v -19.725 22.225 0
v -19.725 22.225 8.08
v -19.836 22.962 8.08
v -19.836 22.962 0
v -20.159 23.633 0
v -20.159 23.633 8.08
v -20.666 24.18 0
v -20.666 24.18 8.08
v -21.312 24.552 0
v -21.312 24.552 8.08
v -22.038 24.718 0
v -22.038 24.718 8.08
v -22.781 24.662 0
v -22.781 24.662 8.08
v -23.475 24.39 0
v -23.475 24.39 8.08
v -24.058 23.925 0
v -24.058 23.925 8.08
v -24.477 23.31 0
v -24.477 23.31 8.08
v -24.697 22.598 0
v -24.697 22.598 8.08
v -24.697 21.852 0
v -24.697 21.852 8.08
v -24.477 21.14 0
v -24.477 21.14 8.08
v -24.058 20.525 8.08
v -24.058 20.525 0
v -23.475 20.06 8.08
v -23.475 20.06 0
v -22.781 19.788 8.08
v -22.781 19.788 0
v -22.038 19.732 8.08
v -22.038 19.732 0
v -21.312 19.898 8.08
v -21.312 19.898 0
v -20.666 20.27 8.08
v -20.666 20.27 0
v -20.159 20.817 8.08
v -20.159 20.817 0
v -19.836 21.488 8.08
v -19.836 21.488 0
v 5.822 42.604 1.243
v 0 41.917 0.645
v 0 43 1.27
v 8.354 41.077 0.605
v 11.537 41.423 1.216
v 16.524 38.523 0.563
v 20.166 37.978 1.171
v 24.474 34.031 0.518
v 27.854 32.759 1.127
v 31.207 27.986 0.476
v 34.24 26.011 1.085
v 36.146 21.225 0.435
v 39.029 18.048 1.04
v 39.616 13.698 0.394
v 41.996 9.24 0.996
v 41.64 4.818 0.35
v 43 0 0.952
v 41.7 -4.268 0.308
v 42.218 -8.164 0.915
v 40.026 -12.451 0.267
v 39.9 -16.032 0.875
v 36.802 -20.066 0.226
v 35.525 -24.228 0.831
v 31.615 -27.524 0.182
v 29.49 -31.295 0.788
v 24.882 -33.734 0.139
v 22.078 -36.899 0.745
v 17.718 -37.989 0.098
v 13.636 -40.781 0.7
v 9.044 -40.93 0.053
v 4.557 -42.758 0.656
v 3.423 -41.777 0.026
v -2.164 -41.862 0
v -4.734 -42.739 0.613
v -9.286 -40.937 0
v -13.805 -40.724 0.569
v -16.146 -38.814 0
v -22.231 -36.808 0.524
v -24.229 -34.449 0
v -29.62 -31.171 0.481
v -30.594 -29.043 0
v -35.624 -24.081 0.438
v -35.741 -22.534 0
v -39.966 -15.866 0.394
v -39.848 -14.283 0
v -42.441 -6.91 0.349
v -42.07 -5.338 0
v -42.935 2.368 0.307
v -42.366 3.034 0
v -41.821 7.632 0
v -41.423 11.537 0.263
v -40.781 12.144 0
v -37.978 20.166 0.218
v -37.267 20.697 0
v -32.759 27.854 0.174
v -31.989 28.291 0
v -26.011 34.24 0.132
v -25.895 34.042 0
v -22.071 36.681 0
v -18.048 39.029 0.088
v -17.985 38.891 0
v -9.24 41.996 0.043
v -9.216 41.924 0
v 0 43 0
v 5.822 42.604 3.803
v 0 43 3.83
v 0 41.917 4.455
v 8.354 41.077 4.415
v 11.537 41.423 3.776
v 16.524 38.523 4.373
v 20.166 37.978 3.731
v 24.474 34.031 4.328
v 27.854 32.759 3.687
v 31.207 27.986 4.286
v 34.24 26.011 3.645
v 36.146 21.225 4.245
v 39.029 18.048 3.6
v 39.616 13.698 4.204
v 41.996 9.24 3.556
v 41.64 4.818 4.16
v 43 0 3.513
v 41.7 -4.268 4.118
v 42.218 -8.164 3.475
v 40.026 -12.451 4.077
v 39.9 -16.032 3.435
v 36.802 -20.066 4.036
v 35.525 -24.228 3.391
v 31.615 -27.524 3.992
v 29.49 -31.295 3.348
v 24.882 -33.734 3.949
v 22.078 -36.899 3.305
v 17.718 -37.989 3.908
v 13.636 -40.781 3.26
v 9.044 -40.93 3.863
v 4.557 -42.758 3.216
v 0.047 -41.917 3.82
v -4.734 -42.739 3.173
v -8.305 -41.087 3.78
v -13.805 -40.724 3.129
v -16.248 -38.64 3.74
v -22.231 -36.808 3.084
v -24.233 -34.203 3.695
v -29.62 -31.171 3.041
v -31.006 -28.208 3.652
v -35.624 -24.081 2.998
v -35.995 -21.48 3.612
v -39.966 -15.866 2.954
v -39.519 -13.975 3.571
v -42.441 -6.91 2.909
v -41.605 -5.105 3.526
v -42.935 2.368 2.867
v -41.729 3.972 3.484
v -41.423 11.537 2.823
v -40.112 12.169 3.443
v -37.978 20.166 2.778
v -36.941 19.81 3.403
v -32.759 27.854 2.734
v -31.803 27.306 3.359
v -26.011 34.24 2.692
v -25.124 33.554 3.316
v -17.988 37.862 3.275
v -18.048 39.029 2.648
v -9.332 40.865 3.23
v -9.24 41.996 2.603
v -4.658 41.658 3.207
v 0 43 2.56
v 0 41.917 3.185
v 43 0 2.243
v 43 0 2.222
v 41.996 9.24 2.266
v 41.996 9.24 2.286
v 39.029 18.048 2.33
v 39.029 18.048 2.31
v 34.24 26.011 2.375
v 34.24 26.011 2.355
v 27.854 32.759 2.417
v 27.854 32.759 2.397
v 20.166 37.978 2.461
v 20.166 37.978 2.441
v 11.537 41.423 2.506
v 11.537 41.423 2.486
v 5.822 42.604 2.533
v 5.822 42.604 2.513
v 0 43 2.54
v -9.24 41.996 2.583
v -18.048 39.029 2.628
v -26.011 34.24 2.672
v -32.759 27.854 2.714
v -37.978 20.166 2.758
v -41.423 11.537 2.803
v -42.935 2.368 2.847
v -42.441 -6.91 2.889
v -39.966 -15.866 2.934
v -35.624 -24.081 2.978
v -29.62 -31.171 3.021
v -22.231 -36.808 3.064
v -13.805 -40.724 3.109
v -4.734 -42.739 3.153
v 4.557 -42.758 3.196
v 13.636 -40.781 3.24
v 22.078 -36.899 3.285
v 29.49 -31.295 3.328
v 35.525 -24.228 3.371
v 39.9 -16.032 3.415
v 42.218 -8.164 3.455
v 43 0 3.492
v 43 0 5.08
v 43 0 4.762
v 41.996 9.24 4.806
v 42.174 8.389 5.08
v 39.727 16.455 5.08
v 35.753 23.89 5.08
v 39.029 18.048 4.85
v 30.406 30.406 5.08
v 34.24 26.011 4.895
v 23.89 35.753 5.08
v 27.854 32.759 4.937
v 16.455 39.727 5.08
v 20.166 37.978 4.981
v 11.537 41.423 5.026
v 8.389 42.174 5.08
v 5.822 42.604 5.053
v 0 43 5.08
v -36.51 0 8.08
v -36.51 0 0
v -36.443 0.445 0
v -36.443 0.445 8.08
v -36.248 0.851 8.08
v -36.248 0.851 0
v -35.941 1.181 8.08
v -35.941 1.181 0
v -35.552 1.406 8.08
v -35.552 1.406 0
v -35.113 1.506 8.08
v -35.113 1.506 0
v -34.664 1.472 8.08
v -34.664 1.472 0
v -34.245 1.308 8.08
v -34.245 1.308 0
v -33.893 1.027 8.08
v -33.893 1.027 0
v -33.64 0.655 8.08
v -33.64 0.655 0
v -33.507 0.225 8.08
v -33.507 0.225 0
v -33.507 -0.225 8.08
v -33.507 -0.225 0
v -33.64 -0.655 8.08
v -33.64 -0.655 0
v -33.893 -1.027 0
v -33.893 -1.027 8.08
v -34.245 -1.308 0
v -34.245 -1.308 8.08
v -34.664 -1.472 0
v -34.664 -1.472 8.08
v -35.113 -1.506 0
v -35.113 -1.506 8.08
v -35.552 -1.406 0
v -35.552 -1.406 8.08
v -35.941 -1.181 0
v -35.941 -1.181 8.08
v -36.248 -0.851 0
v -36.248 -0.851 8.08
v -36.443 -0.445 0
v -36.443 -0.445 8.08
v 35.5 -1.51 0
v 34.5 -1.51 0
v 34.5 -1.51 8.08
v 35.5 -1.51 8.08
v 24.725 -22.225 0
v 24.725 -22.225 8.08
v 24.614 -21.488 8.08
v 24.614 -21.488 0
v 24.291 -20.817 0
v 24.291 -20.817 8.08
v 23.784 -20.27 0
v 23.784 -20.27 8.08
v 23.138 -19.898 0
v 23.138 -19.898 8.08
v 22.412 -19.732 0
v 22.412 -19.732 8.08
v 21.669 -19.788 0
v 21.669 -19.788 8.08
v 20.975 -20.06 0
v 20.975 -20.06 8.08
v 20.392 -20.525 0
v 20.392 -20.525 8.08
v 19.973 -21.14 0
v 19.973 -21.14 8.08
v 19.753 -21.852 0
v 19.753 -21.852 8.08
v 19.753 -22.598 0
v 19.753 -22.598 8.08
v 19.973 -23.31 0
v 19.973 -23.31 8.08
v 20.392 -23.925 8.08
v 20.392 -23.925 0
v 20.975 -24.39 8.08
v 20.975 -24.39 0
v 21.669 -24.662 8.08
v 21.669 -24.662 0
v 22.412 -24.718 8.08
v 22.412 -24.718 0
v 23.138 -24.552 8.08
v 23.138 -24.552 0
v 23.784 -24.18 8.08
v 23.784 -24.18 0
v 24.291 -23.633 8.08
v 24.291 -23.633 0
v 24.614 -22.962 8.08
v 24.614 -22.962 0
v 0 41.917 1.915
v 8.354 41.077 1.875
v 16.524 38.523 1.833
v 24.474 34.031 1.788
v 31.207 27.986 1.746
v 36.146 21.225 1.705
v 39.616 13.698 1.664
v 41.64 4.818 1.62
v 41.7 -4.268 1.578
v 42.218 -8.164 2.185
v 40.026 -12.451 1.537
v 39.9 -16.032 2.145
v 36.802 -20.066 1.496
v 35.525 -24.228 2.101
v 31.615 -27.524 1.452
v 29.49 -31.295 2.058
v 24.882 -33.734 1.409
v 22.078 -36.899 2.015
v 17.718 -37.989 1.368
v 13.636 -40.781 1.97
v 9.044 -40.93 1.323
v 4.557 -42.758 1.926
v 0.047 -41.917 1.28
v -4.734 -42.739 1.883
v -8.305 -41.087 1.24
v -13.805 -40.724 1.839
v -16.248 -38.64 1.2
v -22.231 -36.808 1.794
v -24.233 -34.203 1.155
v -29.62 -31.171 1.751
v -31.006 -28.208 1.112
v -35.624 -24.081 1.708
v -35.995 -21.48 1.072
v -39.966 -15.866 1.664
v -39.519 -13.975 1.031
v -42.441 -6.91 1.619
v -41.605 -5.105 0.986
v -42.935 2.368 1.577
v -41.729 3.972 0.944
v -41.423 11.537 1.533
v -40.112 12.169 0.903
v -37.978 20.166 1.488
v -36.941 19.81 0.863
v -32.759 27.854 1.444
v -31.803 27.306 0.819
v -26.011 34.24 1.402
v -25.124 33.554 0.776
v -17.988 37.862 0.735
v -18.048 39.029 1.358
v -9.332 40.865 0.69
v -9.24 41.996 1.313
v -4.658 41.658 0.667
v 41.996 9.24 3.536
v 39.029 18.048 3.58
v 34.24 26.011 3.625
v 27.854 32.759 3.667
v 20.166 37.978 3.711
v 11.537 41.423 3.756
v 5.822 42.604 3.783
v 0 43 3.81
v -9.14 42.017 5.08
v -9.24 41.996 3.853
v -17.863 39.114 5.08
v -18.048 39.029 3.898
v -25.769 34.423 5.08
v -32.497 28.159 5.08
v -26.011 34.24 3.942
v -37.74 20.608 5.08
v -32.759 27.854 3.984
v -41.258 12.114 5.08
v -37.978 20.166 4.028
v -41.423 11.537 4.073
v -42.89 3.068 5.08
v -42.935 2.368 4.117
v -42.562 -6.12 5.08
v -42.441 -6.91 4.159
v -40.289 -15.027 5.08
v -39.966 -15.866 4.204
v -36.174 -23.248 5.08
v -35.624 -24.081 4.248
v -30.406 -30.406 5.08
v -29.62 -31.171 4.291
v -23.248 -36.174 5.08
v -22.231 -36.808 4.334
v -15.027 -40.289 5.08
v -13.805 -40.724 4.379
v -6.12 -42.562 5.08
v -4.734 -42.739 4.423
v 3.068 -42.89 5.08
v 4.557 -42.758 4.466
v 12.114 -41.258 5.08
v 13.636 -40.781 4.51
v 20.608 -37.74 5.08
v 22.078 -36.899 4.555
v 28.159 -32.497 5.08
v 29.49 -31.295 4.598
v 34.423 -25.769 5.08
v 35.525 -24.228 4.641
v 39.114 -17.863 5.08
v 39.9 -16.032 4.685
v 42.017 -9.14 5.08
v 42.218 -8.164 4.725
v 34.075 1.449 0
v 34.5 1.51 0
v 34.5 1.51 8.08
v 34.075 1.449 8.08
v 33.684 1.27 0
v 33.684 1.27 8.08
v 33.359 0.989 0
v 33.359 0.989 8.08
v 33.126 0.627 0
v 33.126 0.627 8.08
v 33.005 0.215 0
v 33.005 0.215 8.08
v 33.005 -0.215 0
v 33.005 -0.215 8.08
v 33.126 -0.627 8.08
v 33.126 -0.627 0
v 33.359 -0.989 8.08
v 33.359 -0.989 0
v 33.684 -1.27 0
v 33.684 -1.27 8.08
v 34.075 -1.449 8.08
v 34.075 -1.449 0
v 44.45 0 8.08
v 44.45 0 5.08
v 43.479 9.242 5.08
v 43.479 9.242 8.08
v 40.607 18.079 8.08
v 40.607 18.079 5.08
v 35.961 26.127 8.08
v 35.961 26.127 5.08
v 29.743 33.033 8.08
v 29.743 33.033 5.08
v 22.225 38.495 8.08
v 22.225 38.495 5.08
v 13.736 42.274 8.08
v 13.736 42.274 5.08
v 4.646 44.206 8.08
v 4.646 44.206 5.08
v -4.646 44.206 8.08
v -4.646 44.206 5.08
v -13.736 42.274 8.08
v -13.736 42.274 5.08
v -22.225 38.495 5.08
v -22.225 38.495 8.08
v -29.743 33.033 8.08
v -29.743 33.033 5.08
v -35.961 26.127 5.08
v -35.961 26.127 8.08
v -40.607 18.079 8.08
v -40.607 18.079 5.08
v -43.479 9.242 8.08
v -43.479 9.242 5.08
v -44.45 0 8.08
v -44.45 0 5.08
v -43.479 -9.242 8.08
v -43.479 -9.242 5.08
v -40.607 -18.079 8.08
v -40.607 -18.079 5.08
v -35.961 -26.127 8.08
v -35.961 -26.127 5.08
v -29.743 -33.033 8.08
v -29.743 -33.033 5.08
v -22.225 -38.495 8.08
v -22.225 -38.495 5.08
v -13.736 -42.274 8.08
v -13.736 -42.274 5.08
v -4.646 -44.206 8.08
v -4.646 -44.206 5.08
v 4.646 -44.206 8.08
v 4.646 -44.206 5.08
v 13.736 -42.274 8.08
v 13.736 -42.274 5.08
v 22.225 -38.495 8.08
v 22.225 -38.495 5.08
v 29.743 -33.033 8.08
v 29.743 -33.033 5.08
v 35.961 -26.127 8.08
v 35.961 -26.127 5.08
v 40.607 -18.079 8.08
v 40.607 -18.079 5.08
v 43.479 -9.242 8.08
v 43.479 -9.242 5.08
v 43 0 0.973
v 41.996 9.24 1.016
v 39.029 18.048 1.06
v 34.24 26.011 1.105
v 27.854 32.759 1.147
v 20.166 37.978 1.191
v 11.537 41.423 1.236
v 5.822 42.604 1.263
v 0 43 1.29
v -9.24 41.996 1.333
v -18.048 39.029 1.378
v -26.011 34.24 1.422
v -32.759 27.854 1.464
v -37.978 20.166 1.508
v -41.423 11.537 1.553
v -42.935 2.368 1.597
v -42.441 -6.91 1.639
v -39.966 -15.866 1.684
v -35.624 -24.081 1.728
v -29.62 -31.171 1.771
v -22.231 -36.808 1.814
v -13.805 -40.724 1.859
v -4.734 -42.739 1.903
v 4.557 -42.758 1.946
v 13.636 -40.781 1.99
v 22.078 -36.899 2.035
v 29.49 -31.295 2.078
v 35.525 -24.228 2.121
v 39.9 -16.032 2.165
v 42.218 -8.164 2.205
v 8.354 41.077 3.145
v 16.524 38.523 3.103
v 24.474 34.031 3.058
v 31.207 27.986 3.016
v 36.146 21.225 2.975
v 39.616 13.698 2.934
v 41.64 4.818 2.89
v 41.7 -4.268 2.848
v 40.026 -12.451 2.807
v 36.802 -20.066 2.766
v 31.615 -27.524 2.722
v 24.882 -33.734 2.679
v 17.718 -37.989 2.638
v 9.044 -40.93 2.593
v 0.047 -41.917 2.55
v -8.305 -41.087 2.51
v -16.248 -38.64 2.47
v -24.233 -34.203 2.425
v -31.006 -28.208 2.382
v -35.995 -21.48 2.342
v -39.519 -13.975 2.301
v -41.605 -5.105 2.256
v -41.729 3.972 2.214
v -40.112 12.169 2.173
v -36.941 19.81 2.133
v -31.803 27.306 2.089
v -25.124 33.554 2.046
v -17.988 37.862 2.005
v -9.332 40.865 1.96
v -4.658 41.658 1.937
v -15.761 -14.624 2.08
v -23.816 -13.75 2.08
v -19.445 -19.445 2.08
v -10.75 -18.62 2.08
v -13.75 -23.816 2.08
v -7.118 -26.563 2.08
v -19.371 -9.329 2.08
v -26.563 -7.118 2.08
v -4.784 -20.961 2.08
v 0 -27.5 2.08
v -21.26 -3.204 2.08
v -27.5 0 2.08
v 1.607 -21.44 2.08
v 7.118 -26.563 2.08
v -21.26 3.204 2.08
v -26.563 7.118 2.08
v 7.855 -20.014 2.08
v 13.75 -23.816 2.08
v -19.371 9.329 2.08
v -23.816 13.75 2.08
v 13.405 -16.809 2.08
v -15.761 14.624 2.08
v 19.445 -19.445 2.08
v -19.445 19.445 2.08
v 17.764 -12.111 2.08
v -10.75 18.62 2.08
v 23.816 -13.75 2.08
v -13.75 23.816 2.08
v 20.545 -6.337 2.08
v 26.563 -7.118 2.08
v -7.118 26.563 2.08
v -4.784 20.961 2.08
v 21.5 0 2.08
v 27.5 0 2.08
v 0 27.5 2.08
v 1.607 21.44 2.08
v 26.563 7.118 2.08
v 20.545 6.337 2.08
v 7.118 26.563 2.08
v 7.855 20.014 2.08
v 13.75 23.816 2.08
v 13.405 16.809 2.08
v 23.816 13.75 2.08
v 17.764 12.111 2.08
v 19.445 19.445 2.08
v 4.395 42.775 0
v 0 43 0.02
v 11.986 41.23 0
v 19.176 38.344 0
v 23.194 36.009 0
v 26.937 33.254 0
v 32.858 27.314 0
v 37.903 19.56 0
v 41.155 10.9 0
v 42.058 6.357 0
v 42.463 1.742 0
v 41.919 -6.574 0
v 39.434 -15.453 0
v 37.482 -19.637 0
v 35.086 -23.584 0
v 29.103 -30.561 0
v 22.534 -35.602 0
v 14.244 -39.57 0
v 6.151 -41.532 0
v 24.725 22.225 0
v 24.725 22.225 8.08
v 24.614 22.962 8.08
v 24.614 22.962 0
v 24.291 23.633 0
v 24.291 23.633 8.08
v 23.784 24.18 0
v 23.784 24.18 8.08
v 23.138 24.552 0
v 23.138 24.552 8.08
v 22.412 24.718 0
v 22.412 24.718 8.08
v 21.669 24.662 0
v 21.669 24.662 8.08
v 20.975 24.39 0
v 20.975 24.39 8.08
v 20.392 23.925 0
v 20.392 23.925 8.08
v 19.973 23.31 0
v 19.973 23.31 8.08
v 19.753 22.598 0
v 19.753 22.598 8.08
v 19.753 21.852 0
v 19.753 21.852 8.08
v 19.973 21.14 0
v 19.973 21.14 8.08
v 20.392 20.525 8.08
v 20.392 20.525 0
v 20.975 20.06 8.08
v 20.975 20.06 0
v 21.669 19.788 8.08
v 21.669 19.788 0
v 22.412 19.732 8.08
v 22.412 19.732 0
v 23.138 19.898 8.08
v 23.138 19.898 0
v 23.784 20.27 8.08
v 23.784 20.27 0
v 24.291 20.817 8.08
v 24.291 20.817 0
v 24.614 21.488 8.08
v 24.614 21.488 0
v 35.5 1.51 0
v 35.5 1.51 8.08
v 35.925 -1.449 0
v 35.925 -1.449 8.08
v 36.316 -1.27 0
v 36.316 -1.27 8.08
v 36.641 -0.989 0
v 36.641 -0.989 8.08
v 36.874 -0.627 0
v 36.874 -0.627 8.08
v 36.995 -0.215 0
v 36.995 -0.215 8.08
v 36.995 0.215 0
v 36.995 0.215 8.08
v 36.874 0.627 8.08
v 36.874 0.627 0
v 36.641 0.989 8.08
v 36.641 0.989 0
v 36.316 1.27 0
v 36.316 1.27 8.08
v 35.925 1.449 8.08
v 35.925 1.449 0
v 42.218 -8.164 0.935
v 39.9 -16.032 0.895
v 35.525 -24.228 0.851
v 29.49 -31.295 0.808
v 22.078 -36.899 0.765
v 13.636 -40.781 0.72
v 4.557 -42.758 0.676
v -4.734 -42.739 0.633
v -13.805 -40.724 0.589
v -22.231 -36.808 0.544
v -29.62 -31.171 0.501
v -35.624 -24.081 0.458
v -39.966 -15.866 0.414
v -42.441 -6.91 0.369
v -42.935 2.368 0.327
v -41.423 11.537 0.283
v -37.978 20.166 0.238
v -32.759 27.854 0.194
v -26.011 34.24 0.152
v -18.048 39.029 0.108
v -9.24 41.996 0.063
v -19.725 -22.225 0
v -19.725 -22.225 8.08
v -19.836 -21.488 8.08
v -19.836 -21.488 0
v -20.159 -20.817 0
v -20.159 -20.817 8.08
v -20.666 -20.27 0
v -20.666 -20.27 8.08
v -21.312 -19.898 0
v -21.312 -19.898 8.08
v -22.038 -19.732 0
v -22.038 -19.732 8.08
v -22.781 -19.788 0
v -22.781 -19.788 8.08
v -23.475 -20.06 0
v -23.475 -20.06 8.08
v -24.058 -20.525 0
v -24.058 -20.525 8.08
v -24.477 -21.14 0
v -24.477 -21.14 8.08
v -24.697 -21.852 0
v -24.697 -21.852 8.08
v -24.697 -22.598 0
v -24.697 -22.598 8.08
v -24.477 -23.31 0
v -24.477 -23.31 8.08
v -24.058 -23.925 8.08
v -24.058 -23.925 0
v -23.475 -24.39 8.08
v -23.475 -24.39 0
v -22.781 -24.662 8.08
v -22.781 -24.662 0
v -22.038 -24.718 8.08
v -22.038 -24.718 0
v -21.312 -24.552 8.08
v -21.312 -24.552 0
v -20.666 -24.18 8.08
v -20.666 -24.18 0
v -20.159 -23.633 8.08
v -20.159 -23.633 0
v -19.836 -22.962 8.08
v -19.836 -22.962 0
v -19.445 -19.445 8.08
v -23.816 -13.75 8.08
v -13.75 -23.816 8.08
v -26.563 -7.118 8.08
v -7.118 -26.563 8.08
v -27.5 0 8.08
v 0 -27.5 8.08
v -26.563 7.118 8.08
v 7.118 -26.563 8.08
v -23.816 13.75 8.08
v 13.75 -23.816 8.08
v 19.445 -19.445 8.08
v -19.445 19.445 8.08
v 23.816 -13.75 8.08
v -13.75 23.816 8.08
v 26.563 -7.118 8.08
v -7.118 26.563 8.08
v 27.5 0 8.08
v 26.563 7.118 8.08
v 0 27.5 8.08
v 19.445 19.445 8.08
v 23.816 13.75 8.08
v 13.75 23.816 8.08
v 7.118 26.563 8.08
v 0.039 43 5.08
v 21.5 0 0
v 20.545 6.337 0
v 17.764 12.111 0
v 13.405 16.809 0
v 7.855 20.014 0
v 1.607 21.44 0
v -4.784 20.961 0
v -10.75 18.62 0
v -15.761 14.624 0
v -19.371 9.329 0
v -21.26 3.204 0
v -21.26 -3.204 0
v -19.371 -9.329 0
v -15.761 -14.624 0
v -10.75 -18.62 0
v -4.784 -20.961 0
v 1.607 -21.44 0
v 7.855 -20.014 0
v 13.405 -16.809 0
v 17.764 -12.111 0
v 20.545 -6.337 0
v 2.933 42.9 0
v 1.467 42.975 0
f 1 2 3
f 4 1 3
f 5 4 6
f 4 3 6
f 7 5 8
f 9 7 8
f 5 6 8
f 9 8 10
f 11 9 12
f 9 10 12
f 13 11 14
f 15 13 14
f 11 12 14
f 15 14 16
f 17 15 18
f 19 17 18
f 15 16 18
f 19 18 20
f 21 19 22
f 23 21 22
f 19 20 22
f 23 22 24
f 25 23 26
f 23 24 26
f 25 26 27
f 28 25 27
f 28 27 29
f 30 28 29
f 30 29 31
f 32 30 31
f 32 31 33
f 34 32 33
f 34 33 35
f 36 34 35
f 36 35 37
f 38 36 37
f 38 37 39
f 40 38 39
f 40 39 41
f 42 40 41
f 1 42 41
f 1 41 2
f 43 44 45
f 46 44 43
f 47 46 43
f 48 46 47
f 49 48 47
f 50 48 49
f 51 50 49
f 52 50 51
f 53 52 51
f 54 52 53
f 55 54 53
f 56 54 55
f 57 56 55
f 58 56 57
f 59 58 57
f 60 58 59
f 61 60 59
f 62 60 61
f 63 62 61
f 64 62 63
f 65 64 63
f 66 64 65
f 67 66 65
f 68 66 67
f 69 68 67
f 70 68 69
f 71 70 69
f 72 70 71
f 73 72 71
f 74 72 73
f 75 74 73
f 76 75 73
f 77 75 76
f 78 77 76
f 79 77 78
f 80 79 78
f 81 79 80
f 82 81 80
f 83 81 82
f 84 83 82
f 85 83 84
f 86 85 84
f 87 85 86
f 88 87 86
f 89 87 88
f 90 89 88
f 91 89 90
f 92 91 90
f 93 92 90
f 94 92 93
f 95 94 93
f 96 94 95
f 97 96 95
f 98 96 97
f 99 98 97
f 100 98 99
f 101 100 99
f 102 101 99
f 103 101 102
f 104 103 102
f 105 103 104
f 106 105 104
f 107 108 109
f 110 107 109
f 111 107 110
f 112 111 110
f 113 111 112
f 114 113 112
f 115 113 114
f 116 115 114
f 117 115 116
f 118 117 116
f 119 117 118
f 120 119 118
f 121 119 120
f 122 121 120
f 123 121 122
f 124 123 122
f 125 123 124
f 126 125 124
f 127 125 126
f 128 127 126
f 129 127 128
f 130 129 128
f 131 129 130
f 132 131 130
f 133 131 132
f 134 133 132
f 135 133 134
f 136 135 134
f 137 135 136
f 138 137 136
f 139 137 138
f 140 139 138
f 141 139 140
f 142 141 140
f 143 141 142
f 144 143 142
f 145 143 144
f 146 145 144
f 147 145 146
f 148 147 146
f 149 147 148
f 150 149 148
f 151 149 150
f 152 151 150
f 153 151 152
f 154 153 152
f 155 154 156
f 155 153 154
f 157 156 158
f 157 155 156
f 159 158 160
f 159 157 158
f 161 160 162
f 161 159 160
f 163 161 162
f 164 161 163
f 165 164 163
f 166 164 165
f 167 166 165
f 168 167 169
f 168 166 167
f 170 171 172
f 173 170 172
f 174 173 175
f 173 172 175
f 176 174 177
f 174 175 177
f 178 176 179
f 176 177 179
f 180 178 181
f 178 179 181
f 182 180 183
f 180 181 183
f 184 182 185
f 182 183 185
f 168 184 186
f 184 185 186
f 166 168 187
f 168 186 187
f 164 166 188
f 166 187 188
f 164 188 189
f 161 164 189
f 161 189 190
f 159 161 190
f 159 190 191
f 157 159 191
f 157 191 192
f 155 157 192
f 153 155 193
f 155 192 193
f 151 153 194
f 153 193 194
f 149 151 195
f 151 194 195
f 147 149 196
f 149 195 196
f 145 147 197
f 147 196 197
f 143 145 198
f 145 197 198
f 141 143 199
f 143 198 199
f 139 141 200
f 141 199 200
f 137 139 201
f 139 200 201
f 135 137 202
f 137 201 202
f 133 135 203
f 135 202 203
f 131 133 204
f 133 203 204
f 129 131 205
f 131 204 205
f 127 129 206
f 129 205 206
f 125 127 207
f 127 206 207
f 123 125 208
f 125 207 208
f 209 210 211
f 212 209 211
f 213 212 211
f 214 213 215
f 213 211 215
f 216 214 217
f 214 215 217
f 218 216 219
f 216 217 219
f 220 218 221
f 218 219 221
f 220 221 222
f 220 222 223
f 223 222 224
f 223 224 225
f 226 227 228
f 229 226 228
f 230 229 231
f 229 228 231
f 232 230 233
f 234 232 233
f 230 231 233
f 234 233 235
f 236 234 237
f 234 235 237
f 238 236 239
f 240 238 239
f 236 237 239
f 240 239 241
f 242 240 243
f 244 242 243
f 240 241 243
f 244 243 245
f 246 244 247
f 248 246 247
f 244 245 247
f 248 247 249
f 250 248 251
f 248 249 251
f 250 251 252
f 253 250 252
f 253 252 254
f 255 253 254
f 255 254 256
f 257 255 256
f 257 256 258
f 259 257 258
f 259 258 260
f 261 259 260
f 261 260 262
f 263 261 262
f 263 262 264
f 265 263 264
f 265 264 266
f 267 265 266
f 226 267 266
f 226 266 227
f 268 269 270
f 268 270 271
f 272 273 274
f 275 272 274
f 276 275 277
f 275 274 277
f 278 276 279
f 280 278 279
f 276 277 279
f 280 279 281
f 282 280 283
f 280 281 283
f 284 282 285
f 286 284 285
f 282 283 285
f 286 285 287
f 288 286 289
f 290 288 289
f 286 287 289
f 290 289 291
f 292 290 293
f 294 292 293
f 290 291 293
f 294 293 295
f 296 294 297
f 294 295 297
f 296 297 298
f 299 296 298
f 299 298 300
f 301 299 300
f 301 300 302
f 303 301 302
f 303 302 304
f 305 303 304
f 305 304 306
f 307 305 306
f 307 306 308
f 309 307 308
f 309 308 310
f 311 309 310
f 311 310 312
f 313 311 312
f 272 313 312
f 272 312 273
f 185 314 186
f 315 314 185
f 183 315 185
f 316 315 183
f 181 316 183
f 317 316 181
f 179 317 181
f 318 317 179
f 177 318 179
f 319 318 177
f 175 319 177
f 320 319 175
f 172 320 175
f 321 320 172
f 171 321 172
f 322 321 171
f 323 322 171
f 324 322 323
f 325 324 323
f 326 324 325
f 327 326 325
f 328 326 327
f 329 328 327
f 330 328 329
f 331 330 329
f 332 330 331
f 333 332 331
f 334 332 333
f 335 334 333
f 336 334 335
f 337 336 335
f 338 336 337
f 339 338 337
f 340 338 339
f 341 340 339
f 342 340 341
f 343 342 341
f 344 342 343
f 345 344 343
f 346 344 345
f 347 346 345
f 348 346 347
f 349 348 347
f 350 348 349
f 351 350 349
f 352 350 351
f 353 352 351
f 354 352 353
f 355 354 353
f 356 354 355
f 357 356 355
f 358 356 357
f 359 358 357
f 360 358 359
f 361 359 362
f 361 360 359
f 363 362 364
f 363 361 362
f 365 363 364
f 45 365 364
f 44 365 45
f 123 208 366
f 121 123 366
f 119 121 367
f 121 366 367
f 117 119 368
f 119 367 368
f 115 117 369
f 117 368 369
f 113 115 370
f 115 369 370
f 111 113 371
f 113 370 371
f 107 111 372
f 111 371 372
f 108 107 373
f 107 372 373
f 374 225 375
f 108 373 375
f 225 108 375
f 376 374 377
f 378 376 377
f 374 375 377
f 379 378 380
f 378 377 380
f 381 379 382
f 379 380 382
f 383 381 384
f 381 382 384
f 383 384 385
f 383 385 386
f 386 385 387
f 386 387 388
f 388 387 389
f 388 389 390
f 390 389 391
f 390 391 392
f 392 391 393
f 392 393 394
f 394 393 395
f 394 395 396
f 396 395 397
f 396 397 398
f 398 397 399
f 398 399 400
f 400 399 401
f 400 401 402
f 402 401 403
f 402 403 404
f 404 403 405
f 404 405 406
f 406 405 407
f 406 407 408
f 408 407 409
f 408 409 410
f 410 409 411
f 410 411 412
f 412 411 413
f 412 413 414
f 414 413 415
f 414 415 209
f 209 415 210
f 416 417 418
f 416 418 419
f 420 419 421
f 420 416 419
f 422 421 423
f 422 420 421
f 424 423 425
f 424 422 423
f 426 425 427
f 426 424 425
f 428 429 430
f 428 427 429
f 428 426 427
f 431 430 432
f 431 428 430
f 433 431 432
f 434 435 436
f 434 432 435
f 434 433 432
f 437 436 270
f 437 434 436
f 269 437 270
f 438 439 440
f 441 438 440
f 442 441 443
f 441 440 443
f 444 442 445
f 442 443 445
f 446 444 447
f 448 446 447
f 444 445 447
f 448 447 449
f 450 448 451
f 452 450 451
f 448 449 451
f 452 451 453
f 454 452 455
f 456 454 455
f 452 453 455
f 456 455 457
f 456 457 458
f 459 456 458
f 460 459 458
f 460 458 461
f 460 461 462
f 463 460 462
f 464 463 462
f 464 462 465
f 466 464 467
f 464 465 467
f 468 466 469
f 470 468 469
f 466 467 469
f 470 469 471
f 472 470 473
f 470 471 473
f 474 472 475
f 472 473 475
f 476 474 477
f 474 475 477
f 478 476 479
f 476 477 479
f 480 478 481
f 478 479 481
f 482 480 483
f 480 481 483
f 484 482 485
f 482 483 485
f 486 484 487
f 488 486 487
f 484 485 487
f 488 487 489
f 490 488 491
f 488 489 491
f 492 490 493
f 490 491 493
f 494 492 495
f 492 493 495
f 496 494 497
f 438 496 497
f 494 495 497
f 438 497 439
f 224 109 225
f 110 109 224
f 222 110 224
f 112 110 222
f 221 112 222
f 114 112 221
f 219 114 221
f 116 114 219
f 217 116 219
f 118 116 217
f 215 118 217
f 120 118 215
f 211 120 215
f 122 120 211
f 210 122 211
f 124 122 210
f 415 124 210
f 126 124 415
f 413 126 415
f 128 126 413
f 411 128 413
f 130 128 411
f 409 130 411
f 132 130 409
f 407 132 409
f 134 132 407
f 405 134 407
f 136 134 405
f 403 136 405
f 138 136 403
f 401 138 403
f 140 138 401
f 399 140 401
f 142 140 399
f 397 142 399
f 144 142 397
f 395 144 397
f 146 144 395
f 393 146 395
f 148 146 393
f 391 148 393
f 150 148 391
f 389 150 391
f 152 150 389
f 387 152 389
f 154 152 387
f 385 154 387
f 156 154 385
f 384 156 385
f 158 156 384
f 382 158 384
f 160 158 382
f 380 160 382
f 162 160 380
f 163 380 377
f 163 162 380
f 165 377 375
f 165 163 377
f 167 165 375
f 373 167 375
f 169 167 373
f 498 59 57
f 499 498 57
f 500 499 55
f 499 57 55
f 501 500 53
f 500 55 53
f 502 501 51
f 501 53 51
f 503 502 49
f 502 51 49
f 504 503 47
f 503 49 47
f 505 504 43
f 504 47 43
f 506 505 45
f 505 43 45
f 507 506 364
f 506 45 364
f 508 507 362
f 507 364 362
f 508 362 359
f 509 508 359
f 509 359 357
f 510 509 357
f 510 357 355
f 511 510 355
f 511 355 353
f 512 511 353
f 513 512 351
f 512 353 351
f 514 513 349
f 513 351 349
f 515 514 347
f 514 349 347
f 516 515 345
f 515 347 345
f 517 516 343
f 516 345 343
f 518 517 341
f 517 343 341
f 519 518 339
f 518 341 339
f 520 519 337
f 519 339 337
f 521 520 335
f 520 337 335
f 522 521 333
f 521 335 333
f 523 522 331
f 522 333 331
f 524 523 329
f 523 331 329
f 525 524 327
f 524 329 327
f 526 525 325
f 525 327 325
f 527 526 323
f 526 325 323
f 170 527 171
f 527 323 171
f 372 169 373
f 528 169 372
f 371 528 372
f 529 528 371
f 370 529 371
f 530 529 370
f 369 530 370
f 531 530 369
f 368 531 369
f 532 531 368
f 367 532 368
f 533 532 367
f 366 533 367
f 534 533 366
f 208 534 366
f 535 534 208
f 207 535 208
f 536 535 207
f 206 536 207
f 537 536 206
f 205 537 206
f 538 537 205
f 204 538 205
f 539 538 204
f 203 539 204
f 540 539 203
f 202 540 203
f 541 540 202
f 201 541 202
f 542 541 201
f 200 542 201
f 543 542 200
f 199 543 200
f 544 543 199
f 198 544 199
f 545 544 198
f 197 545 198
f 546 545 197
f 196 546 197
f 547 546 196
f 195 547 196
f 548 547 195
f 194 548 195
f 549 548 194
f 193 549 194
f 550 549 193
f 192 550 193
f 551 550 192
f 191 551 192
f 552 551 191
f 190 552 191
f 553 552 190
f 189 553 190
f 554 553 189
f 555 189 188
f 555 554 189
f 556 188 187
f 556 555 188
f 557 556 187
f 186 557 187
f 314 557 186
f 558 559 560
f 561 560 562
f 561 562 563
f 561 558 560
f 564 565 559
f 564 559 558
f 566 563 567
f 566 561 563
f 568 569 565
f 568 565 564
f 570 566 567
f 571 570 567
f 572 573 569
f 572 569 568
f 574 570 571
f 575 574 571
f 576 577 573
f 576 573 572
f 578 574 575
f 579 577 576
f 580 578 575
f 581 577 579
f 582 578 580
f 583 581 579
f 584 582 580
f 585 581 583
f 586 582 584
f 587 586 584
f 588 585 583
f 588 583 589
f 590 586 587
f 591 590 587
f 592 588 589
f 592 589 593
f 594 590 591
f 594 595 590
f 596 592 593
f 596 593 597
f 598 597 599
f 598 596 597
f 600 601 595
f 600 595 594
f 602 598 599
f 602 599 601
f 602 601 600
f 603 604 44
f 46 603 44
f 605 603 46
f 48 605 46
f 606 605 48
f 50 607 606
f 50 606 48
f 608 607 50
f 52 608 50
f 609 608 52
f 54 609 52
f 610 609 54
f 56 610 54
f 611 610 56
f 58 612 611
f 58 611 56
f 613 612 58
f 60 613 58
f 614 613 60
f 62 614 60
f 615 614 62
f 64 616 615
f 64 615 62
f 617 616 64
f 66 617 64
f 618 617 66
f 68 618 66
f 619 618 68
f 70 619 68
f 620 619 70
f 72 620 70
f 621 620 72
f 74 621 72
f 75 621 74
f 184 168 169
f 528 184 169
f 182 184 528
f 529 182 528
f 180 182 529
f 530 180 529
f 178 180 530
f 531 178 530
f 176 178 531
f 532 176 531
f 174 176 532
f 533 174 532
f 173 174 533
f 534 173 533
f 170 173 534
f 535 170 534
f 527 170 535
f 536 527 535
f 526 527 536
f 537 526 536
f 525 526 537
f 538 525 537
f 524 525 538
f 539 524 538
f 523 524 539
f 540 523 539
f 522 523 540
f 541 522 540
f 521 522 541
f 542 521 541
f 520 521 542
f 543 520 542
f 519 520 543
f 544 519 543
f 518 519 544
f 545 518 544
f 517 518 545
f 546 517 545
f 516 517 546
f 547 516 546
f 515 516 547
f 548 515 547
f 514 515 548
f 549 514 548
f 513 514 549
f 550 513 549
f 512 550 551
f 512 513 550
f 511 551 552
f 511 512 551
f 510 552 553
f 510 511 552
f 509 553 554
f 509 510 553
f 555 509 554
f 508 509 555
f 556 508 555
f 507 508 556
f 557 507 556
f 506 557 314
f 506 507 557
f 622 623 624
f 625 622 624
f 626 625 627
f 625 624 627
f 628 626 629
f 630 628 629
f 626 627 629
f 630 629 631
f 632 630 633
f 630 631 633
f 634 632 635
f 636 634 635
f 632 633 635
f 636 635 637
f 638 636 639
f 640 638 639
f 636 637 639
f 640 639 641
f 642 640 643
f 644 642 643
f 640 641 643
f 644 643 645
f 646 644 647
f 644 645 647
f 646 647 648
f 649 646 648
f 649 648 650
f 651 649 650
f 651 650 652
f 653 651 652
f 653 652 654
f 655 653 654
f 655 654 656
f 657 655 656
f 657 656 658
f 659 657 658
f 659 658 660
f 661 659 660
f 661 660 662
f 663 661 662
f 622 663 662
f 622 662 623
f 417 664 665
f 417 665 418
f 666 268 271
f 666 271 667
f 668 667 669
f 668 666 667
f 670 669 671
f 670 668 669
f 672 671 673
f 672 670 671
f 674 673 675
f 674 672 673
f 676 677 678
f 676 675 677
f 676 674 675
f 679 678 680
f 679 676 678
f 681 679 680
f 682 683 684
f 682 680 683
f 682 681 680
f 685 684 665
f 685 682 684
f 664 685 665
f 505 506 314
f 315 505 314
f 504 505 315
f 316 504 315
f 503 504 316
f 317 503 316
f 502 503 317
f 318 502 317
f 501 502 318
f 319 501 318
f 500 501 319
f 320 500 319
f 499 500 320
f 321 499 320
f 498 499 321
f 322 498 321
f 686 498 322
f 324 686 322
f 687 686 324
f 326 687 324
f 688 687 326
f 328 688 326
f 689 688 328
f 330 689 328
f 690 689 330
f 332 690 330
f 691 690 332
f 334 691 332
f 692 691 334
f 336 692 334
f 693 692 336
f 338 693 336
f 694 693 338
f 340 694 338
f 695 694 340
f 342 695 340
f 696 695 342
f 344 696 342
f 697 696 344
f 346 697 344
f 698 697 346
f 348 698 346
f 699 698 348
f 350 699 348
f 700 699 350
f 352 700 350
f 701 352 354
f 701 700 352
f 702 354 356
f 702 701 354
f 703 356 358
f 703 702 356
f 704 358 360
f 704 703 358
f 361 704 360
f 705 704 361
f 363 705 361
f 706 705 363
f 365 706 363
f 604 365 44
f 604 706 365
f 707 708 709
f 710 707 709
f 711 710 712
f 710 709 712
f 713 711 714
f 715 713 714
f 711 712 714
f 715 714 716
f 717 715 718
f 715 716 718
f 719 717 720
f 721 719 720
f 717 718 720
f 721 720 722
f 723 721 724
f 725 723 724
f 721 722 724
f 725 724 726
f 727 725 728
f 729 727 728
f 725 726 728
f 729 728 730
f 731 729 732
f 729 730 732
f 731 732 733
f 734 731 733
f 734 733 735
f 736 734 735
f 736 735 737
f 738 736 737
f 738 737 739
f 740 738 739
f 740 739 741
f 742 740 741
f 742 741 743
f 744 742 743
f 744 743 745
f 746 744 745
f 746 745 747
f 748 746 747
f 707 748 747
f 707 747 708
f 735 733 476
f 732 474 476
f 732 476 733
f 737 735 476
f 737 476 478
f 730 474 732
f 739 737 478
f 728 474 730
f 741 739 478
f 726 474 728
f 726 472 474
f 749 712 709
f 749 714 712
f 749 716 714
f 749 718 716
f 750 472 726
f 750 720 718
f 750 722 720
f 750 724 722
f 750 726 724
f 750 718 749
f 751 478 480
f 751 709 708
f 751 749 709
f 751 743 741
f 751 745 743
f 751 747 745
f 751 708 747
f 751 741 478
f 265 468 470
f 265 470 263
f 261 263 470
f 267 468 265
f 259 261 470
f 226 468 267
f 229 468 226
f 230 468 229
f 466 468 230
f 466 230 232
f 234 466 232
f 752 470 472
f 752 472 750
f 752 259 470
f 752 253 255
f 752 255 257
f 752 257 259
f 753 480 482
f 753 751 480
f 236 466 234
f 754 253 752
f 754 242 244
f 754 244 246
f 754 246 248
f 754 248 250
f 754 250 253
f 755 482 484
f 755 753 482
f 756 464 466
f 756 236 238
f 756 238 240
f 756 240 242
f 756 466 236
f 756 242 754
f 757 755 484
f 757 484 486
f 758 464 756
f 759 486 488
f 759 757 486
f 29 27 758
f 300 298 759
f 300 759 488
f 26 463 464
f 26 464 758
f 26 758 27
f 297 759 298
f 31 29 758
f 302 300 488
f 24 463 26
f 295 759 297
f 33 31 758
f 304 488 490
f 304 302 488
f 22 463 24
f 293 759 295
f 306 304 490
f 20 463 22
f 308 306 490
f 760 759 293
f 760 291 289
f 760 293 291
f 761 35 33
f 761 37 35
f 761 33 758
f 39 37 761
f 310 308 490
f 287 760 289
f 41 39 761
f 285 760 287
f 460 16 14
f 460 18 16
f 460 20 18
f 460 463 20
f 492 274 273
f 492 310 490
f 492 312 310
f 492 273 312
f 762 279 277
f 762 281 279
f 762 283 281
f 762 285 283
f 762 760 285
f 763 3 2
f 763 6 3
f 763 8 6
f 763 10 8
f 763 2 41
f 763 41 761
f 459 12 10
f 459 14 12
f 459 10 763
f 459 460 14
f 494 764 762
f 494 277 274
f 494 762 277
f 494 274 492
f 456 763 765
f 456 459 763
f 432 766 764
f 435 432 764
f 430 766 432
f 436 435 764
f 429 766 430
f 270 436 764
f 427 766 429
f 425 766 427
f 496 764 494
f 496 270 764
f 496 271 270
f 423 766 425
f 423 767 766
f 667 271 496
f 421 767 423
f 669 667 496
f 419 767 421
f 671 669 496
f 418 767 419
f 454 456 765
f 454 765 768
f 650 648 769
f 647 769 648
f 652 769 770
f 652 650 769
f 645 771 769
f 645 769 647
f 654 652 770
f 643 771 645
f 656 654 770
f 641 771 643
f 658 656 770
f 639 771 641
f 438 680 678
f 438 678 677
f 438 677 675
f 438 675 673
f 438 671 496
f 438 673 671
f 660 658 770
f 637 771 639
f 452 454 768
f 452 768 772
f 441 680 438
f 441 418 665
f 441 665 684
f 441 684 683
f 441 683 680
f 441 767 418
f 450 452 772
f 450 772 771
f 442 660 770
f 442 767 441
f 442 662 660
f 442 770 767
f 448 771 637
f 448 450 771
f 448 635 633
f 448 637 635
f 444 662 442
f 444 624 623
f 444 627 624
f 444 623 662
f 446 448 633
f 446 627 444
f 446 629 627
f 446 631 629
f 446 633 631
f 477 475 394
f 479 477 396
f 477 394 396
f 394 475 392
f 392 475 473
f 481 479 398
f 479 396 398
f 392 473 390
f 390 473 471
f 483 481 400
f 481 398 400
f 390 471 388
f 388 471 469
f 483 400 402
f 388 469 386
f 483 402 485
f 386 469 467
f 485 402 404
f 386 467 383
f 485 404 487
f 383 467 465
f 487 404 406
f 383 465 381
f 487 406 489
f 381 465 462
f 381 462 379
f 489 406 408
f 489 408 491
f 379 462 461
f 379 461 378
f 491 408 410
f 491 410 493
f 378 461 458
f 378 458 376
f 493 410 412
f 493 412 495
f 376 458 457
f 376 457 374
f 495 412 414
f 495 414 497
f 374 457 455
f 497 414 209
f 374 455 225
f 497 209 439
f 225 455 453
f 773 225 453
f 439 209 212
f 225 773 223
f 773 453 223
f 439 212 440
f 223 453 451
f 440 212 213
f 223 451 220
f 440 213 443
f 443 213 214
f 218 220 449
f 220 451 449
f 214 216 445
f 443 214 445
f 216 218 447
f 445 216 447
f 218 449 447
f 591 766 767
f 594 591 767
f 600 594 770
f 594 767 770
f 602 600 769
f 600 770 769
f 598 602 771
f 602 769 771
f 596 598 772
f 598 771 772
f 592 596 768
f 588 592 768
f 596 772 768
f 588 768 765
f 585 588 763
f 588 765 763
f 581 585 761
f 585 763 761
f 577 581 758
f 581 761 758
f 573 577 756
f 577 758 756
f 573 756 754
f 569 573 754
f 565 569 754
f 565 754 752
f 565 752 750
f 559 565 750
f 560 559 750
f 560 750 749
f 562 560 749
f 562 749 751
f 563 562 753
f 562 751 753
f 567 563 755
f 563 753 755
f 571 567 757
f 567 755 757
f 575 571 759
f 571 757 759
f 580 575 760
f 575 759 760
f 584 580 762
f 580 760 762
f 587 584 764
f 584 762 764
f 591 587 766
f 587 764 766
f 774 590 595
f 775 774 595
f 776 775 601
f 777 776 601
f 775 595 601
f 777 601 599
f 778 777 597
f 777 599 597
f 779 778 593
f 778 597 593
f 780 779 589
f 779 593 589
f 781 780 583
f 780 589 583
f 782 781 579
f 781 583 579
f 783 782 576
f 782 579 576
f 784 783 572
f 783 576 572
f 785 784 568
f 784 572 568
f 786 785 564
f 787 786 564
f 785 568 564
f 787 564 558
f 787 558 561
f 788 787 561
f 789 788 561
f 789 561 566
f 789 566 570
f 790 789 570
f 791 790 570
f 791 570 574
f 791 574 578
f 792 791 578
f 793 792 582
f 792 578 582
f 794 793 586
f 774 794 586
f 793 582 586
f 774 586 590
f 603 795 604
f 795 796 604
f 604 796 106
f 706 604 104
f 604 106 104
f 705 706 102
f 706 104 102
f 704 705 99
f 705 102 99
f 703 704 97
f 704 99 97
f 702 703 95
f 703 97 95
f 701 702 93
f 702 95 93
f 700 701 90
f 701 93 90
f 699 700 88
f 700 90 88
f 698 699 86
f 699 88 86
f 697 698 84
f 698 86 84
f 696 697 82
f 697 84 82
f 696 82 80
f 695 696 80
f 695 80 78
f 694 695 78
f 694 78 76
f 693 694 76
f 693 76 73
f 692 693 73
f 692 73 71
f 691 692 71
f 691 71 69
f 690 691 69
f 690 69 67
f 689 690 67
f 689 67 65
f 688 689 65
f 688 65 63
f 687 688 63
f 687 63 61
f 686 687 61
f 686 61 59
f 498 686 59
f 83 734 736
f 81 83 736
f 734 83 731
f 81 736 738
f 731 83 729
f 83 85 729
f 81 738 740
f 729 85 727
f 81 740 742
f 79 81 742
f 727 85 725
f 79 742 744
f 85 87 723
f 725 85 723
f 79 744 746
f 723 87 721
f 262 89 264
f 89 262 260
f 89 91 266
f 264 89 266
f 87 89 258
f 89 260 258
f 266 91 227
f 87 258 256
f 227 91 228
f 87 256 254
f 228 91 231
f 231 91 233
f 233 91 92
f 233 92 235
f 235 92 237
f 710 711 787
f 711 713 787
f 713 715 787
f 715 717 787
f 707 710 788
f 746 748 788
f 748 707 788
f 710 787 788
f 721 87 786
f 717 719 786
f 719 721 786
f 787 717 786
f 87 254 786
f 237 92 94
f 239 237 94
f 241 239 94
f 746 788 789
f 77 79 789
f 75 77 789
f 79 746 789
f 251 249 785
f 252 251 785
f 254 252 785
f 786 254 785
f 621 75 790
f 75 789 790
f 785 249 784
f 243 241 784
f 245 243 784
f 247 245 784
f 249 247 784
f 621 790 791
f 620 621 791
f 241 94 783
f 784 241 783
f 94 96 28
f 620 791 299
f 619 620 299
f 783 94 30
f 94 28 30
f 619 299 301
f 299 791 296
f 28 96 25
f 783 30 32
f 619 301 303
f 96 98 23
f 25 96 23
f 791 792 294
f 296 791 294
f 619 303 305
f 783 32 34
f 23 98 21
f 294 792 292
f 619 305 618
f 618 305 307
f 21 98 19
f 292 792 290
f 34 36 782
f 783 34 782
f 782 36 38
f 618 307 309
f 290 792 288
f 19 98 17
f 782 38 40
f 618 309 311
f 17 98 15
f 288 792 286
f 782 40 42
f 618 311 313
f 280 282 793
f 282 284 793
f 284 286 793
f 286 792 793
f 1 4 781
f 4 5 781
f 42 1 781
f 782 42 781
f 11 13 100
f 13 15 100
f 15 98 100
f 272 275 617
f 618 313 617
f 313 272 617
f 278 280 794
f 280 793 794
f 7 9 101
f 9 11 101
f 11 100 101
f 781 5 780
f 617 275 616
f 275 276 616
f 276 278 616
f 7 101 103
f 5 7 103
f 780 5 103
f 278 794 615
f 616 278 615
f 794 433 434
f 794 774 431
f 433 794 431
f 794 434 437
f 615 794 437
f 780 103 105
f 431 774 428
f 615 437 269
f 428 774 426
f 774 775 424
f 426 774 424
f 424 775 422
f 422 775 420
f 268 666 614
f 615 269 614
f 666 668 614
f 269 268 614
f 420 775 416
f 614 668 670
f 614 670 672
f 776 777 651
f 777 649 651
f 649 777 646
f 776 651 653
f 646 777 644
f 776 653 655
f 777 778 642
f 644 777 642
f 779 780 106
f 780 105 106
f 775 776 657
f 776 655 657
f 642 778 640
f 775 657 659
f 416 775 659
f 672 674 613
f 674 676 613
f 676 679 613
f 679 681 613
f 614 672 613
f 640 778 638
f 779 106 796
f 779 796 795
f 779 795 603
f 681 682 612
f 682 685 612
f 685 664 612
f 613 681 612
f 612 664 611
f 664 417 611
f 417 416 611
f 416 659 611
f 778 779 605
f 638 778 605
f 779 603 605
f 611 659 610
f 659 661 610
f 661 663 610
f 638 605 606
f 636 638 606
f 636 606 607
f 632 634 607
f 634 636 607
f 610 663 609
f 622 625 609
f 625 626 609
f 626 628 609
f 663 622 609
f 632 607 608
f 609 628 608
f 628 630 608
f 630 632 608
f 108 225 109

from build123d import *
from build123d.topology import SkipClean

# Parameters (mm, degrees)
SKETCH1_R          = 43
EXTRUDE1_DEPTH     = 5.08
SKETCH2_R          = 44.45
EXTRUDE2_DEPTH     = 3
SKETCH5_R          = 2.5
EXTRUDE4_DEPTH     = 64.378950764
CUT_SWEEP1_PITCH   = 1.27
SKETCH15_R         = 1.51
EXTRUDE10_DEPTH    = 9.525
SKETCH16_R         = 27.5
CUT_EXTRUDE1_DEPTH = 6
SKETCH17_R         = 21.5
CUT_EXTRUDE2_DEPTH = 2.08


with BuildPart() as part:
    # Sketch1 → Extrude1 (new body)
    with BuildSketch(Plane.XY):
        Circle(SKETCH1_R)
    extrude(amount=EXTRUDE1_DEPTH)

    # Sketch2 → Extrude2 (add)
    with BuildSketch(Plane.XY.offset(5.08)):
        Circle(SKETCH2_R)
    extrude(amount=EXTRUDE2_DEPTH)

    # Sketch5 → Extrude4 (cut, through all)
    with BuildSketch(Plane.XY.offset(8.08)):
        with Locations((-22.225, 22.225)):
            Circle(SKETCH5_R)
        with Locations((22.225, 22.225)):
            Circle(SKETCH5_R)
        with Locations((22.225, -22.225)):
            Circle(SKETCH5_R)
        with Locations((-22.225, -22.225)):
            Circle(SKETCH5_R)
    extrude(amount=-EXTRUDE4_DEPTH, mode=Mode.SUBTRACT)

    # Cut-Sweep1: the profile of Sketch10 profile screwed along a right-hand helix of 4 turns, 8 arcs to a turn; built about Z, then put on its axis
    with SkipClean():  # the faces are left unmerged after this step: merging them gives an invalid solid
        cut_sweep1_z = Axis((0, 0, 0), (0, 0, 1))
        cut_sweep1_corners = [(43.0003, 0, -0.625173205), (41.917468245, 0, 0), (43.0003, 0, 0.625173205)]
        with BuildLine(mode=Mode.PRIVATE) as cut_sweep1_profile:
            Line(cut_sweep1_corners[0], cut_sweep1_corners[1])
            Line(cut_sweep1_corners[1], cut_sweep1_corners[2])
            Line(cut_sweep1_corners[2], cut_sweep1_corners[0])
        cut_sweep1_cap = Face(cut_sweep1_profile.wire())
        cut_sweep1_turn_angles = [0, 22.5, 45, 67.5, 90, 112.5, 135, 157.5, 180, 202.5, 225, 247.5, 270, 292.5, 315, 337.5, 360]
        cut_sweep1_turn_weights = [1, 0.9238795325112867, 1, 0.9238795325112867, 1, 0.9238795325112867, 1, 0.9238795325112867, 1, 0.9238795325112867, 1, 0.9238795325112867, 1, 0.9238795325112867, 1, 0.9238795325112867, 1]
        cut_sweep1_turn_rails = [Edge.make_bspline([Vector(p[0], p[1], 0).rotate(cut_sweep1_z, cut_sweep1_turn_angles[k]) / cut_sweep1_turn_weights[k] + Vector(0, 0, p[2] + CUT_SWEEP1_PITCH * cut_sweep1_turn_angles[k] / 360) for k in range(17)], [0, 0, 0, 1, 1, 2, 2, 3, 3, 4, 4, 5, 5, 6, 6, 7, 7, 8, 8, 8], 2, cut_sweep1_turn_weights) for p in cut_sweep1_corners]
        cut_sweep1_turn_sides = [Face.make_surface_from_curves(cut_sweep1_turn_rails[p[0]], cut_sweep1_turn_rails[p[1]]) for p in [(0, 1), (1, 2), (2, 0)]]
        cut_sweep1 = Plane(origin=(0, 0, 4.455), x_dir=(0, 1, 0), z_dir=(0, 0, -1)) * Solid(Shell([*[p.moved(Location((0, 0, CUT_SWEEP1_PITCH * i))) for i in range(4) for p in cut_sweep1_turn_sides], cut_sweep1_cap, cut_sweep1_cap.rotate(cut_sweep1_z, 1440).moved(Location((0, 0, CUT_SWEEP1_PITCH * 1440 / 360)))]))
        add(cut_sweep1, mode=Mode.SUBTRACT)

    # Sketch15 → Extrude10 (cut)
    with SkipClean():  # the faces are left unmerged after this step: merging them gives an invalid solid
        with BuildSketch(Plane(origin=(0, 0, 0), x_dir=(-1, 0, 0), z_dir=(0, 0, -1))):
            with Locations((35, 0)):
                Circle(SKETCH15_R)
            with BuildLine():
                Line((-35.5, 1.51), (-34.5, 1.51))
                ThreePointArc((-34.5, 1.51), (-32.99, 0), (-34.5, -1.51))
                Line((-34.5, -1.51), (-35.5, -1.51))
                ThreePointArc((-35.5, -1.51), (-37.01, 0), (-35.5, 1.51))
            make_face()
        extrude(amount=-EXTRUDE10_DEPTH, mode=Mode.SUBTRACT)

    # Sketch16 → Cut-Extrude1 (cut)
    with SkipClean():  # the faces are left unmerged after this step: merging them gives an invalid solid
        with BuildSketch(Plane.XY.offset(8.08)):
            Circle(SKETCH16_R)
        extrude(amount=-CUT_EXTRUDE1_DEPTH, mode=Mode.SUBTRACT)

    # Sketch17 → Cut-Extrude2 (cut)
    with SkipClean():  # the faces are left unmerged after this step: merging them gives an invalid solid
        with BuildSketch(Plane.XY.offset(2.08)):
            Circle(SKETCH17_R)
        extrude(amount=-CUT_EXTRUDE2_DEPTH, mode=Mode.SUBTRACT)


solid = part.part
